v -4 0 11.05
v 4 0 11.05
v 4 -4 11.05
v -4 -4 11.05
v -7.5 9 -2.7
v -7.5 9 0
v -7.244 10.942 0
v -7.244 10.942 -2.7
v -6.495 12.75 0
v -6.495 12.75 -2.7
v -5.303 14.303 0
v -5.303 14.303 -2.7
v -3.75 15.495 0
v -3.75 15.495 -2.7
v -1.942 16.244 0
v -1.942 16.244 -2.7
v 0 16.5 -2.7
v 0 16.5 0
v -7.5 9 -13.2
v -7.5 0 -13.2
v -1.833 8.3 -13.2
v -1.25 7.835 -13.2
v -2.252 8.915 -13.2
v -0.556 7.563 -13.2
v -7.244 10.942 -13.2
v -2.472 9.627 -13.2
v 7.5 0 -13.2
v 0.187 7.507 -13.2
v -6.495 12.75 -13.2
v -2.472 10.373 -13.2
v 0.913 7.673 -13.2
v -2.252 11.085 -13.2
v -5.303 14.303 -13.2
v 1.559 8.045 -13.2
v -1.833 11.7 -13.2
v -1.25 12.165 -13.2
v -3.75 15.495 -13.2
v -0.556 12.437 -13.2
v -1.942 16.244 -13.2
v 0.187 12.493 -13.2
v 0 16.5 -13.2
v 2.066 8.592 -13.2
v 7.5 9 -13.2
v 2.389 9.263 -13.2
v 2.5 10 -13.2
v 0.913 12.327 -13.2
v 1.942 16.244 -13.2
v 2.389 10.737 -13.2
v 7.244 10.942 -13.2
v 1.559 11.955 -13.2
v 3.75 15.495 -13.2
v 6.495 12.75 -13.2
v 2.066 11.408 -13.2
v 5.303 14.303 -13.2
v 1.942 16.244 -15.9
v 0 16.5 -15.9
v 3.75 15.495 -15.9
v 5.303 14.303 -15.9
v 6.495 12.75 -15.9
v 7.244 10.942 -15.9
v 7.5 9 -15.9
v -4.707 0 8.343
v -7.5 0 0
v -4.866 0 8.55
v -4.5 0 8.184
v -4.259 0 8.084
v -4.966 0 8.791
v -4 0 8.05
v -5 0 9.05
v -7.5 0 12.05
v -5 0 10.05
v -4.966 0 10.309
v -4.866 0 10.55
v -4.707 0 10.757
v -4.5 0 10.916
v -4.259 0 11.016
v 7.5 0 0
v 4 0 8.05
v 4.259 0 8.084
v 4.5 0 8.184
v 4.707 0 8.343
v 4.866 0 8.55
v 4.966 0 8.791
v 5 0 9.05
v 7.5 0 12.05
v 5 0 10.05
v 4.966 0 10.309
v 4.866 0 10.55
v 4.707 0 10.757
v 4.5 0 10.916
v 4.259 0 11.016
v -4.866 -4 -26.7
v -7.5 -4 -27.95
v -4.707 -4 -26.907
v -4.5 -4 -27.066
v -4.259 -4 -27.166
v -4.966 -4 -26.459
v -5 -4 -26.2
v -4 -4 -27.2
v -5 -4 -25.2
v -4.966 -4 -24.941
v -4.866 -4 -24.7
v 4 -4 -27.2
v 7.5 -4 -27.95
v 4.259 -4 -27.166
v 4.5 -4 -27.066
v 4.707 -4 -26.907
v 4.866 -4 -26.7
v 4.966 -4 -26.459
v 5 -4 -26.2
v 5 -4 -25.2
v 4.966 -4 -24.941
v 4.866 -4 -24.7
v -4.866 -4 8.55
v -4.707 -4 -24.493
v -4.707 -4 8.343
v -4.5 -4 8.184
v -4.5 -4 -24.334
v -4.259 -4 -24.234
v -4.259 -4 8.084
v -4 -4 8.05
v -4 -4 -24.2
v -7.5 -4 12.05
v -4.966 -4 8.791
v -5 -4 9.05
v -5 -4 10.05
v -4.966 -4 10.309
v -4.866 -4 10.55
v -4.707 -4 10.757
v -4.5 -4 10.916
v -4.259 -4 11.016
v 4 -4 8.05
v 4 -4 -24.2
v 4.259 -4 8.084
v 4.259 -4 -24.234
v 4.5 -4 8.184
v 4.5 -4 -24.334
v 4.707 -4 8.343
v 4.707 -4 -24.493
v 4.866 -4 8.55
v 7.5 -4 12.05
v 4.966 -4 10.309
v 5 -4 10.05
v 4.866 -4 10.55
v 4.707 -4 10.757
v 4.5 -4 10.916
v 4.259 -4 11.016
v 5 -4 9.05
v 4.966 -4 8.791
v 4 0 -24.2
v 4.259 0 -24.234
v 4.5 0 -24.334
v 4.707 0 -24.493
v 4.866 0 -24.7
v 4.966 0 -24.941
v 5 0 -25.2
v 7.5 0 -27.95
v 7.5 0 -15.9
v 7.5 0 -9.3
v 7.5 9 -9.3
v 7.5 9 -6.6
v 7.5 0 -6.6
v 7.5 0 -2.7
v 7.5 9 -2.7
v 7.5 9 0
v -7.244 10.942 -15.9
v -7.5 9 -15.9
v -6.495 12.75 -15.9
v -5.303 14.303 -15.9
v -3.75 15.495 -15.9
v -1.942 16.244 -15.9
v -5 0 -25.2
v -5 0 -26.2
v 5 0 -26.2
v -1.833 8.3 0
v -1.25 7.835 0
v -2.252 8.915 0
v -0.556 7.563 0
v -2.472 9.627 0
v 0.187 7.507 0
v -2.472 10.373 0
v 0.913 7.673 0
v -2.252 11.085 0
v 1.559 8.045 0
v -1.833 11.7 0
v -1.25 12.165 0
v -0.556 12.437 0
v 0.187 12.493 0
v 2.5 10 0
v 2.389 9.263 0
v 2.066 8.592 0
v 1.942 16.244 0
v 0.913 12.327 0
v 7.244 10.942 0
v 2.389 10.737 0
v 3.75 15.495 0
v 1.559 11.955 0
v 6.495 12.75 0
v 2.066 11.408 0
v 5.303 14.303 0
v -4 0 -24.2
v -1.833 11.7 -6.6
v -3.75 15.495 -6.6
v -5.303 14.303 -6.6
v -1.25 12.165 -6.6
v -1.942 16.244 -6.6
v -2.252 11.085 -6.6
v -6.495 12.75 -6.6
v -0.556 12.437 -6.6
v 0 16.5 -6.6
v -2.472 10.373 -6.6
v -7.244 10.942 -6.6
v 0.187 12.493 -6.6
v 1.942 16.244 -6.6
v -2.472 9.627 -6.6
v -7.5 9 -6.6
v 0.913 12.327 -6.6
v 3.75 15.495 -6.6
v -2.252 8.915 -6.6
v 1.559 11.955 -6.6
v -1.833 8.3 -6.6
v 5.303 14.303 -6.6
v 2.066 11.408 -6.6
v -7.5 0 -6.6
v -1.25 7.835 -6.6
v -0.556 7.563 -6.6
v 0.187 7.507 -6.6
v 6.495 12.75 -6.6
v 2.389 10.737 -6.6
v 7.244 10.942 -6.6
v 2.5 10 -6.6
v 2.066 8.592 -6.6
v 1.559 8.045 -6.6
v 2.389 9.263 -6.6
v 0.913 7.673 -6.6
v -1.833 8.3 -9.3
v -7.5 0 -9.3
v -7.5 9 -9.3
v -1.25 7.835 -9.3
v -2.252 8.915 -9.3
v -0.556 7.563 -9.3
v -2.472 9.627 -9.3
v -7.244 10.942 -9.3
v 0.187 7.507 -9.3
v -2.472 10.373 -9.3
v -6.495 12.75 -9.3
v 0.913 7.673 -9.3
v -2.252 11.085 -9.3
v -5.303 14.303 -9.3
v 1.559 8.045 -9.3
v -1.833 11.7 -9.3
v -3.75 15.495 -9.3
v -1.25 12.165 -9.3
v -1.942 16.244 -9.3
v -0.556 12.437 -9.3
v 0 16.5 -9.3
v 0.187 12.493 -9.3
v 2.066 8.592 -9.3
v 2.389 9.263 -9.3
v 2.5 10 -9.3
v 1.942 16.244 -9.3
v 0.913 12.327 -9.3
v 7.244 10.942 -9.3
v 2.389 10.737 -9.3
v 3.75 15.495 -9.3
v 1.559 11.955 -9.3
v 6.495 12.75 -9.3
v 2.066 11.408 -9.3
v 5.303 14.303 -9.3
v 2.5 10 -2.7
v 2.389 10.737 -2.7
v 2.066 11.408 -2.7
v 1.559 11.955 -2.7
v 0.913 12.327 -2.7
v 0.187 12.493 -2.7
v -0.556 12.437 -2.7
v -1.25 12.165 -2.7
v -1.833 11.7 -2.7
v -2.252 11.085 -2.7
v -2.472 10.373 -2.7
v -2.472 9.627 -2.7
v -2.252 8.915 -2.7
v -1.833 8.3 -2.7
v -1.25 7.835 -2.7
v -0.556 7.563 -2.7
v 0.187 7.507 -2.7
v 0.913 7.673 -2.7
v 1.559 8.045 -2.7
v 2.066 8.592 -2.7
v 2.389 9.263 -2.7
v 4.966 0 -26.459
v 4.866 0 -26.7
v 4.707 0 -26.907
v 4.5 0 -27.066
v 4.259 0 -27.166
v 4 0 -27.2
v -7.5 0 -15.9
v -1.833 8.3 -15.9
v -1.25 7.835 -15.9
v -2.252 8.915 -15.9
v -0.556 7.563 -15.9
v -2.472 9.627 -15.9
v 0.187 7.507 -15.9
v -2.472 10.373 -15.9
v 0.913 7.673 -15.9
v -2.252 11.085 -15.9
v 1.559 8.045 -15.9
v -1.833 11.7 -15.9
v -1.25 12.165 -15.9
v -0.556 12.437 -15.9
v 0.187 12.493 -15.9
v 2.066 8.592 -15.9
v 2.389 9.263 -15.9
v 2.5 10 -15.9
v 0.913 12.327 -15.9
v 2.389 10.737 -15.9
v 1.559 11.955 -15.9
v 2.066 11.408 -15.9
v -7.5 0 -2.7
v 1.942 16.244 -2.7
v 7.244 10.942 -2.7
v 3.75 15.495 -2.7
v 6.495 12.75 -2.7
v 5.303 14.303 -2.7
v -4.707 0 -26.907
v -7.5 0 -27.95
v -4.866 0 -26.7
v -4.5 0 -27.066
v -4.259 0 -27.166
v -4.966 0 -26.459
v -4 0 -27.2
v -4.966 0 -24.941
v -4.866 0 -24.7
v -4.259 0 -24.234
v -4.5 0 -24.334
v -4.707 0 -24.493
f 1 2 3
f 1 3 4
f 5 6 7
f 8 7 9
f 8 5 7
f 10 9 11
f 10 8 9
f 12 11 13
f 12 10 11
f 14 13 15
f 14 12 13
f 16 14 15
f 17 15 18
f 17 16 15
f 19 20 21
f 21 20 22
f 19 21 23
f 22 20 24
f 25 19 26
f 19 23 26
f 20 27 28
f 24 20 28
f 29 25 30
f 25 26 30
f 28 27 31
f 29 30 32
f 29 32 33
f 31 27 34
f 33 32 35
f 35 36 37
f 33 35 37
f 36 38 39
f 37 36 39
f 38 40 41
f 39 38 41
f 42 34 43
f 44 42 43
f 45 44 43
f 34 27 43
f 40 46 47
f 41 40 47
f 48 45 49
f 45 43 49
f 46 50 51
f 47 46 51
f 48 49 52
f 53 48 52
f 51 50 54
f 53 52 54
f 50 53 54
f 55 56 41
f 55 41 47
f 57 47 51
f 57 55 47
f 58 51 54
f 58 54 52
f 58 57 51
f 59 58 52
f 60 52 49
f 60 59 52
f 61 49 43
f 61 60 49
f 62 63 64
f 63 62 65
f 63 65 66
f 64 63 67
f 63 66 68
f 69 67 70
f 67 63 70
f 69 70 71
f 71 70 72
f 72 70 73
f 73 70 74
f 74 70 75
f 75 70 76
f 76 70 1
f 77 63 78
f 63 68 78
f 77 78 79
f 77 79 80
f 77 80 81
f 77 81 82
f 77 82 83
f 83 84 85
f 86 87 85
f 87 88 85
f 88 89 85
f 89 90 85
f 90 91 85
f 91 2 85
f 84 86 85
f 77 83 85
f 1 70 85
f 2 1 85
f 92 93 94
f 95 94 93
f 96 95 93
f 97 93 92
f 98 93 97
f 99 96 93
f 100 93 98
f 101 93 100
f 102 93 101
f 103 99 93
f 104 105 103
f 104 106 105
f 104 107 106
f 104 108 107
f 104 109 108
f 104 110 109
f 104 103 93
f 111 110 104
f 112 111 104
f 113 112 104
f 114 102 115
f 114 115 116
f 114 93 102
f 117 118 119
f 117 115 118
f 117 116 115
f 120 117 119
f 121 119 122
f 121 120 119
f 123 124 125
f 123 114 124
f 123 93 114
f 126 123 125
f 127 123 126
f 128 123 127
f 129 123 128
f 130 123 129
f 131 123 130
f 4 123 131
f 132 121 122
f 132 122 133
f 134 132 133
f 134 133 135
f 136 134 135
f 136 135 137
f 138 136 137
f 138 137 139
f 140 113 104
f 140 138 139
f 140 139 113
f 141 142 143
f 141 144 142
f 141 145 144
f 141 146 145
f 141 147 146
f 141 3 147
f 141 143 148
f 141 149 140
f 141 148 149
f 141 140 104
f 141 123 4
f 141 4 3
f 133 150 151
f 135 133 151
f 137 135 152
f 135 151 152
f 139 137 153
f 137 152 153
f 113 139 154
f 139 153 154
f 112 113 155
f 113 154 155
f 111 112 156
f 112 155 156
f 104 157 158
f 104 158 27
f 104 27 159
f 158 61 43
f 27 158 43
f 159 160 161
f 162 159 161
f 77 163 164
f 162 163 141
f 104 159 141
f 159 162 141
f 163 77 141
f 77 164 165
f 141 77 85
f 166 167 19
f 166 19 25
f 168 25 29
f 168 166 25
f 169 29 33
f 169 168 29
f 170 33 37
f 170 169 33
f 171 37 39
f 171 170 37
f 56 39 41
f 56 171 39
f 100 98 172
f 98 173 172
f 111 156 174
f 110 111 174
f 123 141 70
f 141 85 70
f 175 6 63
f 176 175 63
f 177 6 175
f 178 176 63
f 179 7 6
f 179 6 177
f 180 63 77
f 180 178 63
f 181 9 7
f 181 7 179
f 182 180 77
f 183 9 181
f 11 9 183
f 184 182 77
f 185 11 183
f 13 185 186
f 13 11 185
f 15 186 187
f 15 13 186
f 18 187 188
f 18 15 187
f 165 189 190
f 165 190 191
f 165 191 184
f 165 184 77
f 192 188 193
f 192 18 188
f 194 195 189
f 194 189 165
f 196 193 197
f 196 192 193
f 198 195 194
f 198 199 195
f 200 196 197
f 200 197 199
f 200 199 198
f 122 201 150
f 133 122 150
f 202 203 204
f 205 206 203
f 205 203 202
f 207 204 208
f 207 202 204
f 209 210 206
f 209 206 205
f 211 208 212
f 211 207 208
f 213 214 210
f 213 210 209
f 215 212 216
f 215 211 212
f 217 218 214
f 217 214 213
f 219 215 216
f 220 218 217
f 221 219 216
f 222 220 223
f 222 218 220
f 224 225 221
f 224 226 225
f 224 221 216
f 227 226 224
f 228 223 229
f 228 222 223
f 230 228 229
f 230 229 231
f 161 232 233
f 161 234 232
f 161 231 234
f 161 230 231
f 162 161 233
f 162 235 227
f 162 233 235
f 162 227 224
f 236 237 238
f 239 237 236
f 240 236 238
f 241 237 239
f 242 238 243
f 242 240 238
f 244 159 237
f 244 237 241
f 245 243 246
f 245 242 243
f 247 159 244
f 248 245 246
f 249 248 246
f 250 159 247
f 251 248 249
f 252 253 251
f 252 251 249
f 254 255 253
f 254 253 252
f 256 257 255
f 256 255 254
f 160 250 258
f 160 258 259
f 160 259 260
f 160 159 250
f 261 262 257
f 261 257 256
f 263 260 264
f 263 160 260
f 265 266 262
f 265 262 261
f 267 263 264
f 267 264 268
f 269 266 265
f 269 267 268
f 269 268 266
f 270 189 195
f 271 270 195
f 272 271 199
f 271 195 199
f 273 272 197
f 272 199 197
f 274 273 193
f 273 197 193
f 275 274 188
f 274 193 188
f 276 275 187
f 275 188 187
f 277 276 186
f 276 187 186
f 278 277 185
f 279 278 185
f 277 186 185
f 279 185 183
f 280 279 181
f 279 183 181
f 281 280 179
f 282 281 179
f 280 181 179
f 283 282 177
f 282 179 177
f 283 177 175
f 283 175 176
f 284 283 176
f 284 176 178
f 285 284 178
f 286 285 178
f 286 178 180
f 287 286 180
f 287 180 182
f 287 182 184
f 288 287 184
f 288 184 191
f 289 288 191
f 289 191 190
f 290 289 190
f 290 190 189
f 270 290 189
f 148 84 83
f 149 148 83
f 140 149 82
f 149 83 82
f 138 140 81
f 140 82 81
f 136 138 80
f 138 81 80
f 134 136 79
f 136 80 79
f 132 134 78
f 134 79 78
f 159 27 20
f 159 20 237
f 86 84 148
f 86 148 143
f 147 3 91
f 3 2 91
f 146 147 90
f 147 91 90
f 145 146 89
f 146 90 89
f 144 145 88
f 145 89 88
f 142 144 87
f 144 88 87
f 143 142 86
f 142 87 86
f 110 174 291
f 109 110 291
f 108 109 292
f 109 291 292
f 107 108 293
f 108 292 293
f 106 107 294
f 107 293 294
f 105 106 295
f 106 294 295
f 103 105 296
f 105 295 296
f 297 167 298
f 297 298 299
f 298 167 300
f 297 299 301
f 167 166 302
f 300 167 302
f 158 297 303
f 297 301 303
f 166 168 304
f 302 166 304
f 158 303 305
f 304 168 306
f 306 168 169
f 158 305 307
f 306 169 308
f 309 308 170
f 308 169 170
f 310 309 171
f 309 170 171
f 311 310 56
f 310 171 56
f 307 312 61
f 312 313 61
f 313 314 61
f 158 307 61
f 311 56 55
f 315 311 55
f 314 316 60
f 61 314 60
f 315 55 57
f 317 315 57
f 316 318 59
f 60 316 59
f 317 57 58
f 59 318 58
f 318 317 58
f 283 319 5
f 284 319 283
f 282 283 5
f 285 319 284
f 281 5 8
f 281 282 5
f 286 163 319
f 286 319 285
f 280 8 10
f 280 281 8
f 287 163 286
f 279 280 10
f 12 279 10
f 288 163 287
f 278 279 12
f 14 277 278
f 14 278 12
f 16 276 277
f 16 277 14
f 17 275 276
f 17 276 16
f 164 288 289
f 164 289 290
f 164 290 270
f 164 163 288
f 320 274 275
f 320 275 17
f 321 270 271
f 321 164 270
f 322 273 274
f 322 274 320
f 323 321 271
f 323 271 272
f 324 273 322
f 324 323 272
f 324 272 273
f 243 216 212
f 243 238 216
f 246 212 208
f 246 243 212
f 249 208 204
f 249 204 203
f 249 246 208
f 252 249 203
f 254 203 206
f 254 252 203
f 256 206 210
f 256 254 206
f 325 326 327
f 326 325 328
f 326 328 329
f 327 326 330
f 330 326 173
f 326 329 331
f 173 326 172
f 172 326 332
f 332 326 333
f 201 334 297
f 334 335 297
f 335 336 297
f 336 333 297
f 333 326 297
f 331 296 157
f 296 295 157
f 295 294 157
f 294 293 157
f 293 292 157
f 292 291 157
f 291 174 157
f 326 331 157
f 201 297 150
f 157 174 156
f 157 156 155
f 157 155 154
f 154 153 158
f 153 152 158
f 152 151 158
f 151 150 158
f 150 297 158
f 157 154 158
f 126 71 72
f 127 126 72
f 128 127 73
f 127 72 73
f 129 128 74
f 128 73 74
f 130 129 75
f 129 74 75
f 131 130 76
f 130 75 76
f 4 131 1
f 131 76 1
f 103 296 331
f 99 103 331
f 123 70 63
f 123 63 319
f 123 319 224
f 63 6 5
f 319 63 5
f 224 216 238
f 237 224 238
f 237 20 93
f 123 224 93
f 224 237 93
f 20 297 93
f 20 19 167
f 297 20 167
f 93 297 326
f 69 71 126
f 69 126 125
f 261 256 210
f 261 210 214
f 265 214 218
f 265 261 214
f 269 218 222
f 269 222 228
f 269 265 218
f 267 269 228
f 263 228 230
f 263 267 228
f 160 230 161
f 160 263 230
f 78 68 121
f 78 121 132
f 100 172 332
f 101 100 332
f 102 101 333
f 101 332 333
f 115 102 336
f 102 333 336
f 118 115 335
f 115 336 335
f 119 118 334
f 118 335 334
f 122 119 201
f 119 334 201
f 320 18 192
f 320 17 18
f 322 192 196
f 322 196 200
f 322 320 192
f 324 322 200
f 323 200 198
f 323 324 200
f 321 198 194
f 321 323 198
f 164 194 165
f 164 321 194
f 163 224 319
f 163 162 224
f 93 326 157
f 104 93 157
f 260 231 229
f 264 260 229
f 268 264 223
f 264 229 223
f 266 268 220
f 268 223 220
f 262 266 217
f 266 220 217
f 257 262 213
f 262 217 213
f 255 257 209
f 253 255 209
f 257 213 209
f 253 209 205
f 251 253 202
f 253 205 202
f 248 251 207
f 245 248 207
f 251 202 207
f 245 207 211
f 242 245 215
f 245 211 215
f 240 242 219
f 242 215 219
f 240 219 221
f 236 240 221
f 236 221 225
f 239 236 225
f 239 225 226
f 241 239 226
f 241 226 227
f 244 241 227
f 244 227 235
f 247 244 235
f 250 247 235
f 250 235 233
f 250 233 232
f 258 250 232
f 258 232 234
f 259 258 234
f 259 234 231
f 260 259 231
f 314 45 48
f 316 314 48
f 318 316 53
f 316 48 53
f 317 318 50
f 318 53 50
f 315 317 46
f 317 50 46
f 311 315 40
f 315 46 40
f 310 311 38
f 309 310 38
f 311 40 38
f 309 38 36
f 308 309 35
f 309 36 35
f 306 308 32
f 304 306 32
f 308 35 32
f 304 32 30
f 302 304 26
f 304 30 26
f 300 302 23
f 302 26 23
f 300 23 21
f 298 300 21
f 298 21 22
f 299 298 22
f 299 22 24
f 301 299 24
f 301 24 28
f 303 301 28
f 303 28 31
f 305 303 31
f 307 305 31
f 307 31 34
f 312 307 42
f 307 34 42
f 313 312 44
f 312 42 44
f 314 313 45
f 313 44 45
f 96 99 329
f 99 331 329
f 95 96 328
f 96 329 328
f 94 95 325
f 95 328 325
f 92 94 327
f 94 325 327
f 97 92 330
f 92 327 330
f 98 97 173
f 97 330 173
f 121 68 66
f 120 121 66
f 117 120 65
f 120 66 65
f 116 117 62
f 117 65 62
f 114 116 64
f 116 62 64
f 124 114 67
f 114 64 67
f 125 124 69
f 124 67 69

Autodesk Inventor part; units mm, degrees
ref_plane "YZ Plane" through (0, 0, 0) normal (1, 0, 0) x (0, 1, 0)
ref_plane "XZ Plane" through (0, 0, 0) normal (0, 1, 0) x (-1, 0, 0)
ref_plane "XY Plane" through (0, 0, 0) normal (0, 0, 1) x (1, 0, 0)
sketch "Sketch4" plane through (0, 0, 0) normal (0, 0, 1) x (1, 0, 0)
  line L0 (-10.5, 0) -> (10.5, 0) projected
  line L1 (0, -3.3) -> (0, 19.8) projected
  line L2 (-7.5, 0) -> (7.5, 0)
  line L3 (7.5, 0) -> (7.5, 16.5)
  line L4 (7.5, 16.5) -> (-7.5, 16.5)
  line L5 (-7.5, 16.5) -> (-7.5, 0)
  circle A0 centre (0, 10) radius 2.5
  point P0 (0, 0)
  dimension "d0" = 7.5
  dimension "d1" = 7.5
  dimension "d2" = 16.5
  dimension "d3" = 5
  dimension "d4" = 6.5
extrude "Extrusion1" add sketch "Sketch4" against normal blind 15.9 contours L5 L4 L1 A0 L0 | L1 A0 L4 L3 L0
fillet "Fillet1" radius 7.5 2 edges at (7.5, 16.5, -7.95) (-7.5, 16.5, -7.95)
sketch "Sketch10" plane through (-7.5, 0, 0) normal (0, -1, 0) x (1, 0, 0)
  line L0 (-3, 0) -> (18, 0) projected
  line L1 (7.5, -19.08) -> (7.5, 3.18) projected
  line L2 (15, 12.05) -> (0, 12.05)
  line L3 (0, 12.05) -> (0, -27.95)
  line L4 (0, -27.95) -> (15, -27.95)
  line L5 (15, -27.95) -> (15, 12.05)
  line L6 (11.5, 11.05) -> (3.5, 11.05)
  line L7 (2.5, 10.05) -> (2.5, 9.05)
  line L8 (3.5, 8.05) -> (11.5, 8.05)
  line L9 (12.5, 9.05) -> (12.5, 10.05)
  line L10 (15, 0) -> (15, -15.9) projected
  line L11 (15, -8.075) -> (0, -8.075)
  line L12 (0, -15.9) -> (0, 0) projected
  line L13 (11.5, -27.2) -> (3.5, -27.2)
  line L14 (2.5, -26.2) -> (2.5, -25.2)
  line L15 (3.5, -24.2) -> (11.5, -24.2)
  line L16 (12.5, -25.2) -> (12.5, -26.2)
  arc A0 (11.5, 8.05) -> (12.5, 9.05) centre (11.5, 9.05) ccw
  arc A1 (12.5, 10.05) -> (11.5, 11.05) centre (11.5, 10.05) ccw
  arc A2 (3.5, 11.05) -> (2.5, 10.05) centre (3.5, 10.05) ccw
  arc A3 (2.5, 9.05) -> (3.5, 8.05) centre (3.5, 9.05) ccw
  arc A4 (12.5, -25.2) -> (11.5, -24.2) centre (11.5, -25.2) ccw
  arc A5 (11.5, -27.2) -> (12.5, -26.2) centre (11.5, -26.2) ccw
  arc A6 (3.5, -24.2) -> (2.5, -25.2) centre (3.5, -25.2) ccw
  arc A7 (2.5, -26.2) -> (3.5, -27.2) centre (3.5, -26.2) ccw
  point P0 (7.5, 0)
  point P1 (12.5, 11.05)
  point P2 (2.5, 8.05)
  point P3 (2.5, 11.05)
  point P4 (12.5, 8.05)
  point P5 (15, -6.55)
  point P6 (15, -9.6)
  point P7 (0, -9.6)
  point P8 (0, -6.55)
  point P9 (12.5, -27.2)
  point P10 (2.5, -24.2)
  point P11 (2.5, -27.2)
  point P12 (12.5, -24.2)
  point P13 (15, -2.8)
  dimension "d20" = 15
  dimension "d21" = 40
  dimension "d22" = 12.05
  dimension "d23" = 7.5
  dimension "d24" = 3
  dimension "d25" = 1
  dimension "d26" = 10
  dimension "d27" = 2.5
  dimension "d28" = 8.075
  dimension "d29" = 1
extrude "Extrusion5" add sketch "Sketch10" along normal blind 4
sketch "Sketch13" plane through (7.5, 9, 0) normal (1, 0, 0) x (0, 0, -1)
  line L0 (0, -17.1) -> (0, 11.6) projected
  line L1 (35.95, -9) -> (-20.05, -9) projected
  line L2 (0, -9) -> (0, 0) projected
  line L3 (0, 7.5) -> (15.9, 7.5) projected
  line L4 (0, -9) -> (2.7, -9)
  line L5 (2.7, -9) -> (2.7, 7.5)
  line L6 (2.7, 7.5) -> (0, 7.5)
  line L7 (0, 7.5) -> (0, -9)
  line L8 (15.9, -9) -> (15.9, 0) projected
  line L9 (15.9, -9) -> (13.2, -9)
  line L10 (13.2, -9) -> (13.2, 7.5)
  line L11 (13.2, 7.5) -> (15.9, 7.5)
  line L12 (15.9, 7.5) -> (15.9, -9)
  line L13 (6.6, -9) -> (9.3, -9)
  line L14 (9.3, -9) -> (9.3, 7.5)
  line L15 (9.3, 7.5) -> (6.6, 7.5)
  line L16 (6.6, 7.5) -> (6.6, -9)
  dimension "d47" = 2.7
  dimension "d48" = 2.7
  dimension "d49" = 2.7
  dimension "d50" = 15.9
  dimension "d51" = 3.9
  dimension "d52" = 3.9
extrude "Extrusion8" cut sketch "Sketch13" against normal through all contours L5 L3 L16 L1 | L14 L3 L10 L1
properties part number "droneMount"
